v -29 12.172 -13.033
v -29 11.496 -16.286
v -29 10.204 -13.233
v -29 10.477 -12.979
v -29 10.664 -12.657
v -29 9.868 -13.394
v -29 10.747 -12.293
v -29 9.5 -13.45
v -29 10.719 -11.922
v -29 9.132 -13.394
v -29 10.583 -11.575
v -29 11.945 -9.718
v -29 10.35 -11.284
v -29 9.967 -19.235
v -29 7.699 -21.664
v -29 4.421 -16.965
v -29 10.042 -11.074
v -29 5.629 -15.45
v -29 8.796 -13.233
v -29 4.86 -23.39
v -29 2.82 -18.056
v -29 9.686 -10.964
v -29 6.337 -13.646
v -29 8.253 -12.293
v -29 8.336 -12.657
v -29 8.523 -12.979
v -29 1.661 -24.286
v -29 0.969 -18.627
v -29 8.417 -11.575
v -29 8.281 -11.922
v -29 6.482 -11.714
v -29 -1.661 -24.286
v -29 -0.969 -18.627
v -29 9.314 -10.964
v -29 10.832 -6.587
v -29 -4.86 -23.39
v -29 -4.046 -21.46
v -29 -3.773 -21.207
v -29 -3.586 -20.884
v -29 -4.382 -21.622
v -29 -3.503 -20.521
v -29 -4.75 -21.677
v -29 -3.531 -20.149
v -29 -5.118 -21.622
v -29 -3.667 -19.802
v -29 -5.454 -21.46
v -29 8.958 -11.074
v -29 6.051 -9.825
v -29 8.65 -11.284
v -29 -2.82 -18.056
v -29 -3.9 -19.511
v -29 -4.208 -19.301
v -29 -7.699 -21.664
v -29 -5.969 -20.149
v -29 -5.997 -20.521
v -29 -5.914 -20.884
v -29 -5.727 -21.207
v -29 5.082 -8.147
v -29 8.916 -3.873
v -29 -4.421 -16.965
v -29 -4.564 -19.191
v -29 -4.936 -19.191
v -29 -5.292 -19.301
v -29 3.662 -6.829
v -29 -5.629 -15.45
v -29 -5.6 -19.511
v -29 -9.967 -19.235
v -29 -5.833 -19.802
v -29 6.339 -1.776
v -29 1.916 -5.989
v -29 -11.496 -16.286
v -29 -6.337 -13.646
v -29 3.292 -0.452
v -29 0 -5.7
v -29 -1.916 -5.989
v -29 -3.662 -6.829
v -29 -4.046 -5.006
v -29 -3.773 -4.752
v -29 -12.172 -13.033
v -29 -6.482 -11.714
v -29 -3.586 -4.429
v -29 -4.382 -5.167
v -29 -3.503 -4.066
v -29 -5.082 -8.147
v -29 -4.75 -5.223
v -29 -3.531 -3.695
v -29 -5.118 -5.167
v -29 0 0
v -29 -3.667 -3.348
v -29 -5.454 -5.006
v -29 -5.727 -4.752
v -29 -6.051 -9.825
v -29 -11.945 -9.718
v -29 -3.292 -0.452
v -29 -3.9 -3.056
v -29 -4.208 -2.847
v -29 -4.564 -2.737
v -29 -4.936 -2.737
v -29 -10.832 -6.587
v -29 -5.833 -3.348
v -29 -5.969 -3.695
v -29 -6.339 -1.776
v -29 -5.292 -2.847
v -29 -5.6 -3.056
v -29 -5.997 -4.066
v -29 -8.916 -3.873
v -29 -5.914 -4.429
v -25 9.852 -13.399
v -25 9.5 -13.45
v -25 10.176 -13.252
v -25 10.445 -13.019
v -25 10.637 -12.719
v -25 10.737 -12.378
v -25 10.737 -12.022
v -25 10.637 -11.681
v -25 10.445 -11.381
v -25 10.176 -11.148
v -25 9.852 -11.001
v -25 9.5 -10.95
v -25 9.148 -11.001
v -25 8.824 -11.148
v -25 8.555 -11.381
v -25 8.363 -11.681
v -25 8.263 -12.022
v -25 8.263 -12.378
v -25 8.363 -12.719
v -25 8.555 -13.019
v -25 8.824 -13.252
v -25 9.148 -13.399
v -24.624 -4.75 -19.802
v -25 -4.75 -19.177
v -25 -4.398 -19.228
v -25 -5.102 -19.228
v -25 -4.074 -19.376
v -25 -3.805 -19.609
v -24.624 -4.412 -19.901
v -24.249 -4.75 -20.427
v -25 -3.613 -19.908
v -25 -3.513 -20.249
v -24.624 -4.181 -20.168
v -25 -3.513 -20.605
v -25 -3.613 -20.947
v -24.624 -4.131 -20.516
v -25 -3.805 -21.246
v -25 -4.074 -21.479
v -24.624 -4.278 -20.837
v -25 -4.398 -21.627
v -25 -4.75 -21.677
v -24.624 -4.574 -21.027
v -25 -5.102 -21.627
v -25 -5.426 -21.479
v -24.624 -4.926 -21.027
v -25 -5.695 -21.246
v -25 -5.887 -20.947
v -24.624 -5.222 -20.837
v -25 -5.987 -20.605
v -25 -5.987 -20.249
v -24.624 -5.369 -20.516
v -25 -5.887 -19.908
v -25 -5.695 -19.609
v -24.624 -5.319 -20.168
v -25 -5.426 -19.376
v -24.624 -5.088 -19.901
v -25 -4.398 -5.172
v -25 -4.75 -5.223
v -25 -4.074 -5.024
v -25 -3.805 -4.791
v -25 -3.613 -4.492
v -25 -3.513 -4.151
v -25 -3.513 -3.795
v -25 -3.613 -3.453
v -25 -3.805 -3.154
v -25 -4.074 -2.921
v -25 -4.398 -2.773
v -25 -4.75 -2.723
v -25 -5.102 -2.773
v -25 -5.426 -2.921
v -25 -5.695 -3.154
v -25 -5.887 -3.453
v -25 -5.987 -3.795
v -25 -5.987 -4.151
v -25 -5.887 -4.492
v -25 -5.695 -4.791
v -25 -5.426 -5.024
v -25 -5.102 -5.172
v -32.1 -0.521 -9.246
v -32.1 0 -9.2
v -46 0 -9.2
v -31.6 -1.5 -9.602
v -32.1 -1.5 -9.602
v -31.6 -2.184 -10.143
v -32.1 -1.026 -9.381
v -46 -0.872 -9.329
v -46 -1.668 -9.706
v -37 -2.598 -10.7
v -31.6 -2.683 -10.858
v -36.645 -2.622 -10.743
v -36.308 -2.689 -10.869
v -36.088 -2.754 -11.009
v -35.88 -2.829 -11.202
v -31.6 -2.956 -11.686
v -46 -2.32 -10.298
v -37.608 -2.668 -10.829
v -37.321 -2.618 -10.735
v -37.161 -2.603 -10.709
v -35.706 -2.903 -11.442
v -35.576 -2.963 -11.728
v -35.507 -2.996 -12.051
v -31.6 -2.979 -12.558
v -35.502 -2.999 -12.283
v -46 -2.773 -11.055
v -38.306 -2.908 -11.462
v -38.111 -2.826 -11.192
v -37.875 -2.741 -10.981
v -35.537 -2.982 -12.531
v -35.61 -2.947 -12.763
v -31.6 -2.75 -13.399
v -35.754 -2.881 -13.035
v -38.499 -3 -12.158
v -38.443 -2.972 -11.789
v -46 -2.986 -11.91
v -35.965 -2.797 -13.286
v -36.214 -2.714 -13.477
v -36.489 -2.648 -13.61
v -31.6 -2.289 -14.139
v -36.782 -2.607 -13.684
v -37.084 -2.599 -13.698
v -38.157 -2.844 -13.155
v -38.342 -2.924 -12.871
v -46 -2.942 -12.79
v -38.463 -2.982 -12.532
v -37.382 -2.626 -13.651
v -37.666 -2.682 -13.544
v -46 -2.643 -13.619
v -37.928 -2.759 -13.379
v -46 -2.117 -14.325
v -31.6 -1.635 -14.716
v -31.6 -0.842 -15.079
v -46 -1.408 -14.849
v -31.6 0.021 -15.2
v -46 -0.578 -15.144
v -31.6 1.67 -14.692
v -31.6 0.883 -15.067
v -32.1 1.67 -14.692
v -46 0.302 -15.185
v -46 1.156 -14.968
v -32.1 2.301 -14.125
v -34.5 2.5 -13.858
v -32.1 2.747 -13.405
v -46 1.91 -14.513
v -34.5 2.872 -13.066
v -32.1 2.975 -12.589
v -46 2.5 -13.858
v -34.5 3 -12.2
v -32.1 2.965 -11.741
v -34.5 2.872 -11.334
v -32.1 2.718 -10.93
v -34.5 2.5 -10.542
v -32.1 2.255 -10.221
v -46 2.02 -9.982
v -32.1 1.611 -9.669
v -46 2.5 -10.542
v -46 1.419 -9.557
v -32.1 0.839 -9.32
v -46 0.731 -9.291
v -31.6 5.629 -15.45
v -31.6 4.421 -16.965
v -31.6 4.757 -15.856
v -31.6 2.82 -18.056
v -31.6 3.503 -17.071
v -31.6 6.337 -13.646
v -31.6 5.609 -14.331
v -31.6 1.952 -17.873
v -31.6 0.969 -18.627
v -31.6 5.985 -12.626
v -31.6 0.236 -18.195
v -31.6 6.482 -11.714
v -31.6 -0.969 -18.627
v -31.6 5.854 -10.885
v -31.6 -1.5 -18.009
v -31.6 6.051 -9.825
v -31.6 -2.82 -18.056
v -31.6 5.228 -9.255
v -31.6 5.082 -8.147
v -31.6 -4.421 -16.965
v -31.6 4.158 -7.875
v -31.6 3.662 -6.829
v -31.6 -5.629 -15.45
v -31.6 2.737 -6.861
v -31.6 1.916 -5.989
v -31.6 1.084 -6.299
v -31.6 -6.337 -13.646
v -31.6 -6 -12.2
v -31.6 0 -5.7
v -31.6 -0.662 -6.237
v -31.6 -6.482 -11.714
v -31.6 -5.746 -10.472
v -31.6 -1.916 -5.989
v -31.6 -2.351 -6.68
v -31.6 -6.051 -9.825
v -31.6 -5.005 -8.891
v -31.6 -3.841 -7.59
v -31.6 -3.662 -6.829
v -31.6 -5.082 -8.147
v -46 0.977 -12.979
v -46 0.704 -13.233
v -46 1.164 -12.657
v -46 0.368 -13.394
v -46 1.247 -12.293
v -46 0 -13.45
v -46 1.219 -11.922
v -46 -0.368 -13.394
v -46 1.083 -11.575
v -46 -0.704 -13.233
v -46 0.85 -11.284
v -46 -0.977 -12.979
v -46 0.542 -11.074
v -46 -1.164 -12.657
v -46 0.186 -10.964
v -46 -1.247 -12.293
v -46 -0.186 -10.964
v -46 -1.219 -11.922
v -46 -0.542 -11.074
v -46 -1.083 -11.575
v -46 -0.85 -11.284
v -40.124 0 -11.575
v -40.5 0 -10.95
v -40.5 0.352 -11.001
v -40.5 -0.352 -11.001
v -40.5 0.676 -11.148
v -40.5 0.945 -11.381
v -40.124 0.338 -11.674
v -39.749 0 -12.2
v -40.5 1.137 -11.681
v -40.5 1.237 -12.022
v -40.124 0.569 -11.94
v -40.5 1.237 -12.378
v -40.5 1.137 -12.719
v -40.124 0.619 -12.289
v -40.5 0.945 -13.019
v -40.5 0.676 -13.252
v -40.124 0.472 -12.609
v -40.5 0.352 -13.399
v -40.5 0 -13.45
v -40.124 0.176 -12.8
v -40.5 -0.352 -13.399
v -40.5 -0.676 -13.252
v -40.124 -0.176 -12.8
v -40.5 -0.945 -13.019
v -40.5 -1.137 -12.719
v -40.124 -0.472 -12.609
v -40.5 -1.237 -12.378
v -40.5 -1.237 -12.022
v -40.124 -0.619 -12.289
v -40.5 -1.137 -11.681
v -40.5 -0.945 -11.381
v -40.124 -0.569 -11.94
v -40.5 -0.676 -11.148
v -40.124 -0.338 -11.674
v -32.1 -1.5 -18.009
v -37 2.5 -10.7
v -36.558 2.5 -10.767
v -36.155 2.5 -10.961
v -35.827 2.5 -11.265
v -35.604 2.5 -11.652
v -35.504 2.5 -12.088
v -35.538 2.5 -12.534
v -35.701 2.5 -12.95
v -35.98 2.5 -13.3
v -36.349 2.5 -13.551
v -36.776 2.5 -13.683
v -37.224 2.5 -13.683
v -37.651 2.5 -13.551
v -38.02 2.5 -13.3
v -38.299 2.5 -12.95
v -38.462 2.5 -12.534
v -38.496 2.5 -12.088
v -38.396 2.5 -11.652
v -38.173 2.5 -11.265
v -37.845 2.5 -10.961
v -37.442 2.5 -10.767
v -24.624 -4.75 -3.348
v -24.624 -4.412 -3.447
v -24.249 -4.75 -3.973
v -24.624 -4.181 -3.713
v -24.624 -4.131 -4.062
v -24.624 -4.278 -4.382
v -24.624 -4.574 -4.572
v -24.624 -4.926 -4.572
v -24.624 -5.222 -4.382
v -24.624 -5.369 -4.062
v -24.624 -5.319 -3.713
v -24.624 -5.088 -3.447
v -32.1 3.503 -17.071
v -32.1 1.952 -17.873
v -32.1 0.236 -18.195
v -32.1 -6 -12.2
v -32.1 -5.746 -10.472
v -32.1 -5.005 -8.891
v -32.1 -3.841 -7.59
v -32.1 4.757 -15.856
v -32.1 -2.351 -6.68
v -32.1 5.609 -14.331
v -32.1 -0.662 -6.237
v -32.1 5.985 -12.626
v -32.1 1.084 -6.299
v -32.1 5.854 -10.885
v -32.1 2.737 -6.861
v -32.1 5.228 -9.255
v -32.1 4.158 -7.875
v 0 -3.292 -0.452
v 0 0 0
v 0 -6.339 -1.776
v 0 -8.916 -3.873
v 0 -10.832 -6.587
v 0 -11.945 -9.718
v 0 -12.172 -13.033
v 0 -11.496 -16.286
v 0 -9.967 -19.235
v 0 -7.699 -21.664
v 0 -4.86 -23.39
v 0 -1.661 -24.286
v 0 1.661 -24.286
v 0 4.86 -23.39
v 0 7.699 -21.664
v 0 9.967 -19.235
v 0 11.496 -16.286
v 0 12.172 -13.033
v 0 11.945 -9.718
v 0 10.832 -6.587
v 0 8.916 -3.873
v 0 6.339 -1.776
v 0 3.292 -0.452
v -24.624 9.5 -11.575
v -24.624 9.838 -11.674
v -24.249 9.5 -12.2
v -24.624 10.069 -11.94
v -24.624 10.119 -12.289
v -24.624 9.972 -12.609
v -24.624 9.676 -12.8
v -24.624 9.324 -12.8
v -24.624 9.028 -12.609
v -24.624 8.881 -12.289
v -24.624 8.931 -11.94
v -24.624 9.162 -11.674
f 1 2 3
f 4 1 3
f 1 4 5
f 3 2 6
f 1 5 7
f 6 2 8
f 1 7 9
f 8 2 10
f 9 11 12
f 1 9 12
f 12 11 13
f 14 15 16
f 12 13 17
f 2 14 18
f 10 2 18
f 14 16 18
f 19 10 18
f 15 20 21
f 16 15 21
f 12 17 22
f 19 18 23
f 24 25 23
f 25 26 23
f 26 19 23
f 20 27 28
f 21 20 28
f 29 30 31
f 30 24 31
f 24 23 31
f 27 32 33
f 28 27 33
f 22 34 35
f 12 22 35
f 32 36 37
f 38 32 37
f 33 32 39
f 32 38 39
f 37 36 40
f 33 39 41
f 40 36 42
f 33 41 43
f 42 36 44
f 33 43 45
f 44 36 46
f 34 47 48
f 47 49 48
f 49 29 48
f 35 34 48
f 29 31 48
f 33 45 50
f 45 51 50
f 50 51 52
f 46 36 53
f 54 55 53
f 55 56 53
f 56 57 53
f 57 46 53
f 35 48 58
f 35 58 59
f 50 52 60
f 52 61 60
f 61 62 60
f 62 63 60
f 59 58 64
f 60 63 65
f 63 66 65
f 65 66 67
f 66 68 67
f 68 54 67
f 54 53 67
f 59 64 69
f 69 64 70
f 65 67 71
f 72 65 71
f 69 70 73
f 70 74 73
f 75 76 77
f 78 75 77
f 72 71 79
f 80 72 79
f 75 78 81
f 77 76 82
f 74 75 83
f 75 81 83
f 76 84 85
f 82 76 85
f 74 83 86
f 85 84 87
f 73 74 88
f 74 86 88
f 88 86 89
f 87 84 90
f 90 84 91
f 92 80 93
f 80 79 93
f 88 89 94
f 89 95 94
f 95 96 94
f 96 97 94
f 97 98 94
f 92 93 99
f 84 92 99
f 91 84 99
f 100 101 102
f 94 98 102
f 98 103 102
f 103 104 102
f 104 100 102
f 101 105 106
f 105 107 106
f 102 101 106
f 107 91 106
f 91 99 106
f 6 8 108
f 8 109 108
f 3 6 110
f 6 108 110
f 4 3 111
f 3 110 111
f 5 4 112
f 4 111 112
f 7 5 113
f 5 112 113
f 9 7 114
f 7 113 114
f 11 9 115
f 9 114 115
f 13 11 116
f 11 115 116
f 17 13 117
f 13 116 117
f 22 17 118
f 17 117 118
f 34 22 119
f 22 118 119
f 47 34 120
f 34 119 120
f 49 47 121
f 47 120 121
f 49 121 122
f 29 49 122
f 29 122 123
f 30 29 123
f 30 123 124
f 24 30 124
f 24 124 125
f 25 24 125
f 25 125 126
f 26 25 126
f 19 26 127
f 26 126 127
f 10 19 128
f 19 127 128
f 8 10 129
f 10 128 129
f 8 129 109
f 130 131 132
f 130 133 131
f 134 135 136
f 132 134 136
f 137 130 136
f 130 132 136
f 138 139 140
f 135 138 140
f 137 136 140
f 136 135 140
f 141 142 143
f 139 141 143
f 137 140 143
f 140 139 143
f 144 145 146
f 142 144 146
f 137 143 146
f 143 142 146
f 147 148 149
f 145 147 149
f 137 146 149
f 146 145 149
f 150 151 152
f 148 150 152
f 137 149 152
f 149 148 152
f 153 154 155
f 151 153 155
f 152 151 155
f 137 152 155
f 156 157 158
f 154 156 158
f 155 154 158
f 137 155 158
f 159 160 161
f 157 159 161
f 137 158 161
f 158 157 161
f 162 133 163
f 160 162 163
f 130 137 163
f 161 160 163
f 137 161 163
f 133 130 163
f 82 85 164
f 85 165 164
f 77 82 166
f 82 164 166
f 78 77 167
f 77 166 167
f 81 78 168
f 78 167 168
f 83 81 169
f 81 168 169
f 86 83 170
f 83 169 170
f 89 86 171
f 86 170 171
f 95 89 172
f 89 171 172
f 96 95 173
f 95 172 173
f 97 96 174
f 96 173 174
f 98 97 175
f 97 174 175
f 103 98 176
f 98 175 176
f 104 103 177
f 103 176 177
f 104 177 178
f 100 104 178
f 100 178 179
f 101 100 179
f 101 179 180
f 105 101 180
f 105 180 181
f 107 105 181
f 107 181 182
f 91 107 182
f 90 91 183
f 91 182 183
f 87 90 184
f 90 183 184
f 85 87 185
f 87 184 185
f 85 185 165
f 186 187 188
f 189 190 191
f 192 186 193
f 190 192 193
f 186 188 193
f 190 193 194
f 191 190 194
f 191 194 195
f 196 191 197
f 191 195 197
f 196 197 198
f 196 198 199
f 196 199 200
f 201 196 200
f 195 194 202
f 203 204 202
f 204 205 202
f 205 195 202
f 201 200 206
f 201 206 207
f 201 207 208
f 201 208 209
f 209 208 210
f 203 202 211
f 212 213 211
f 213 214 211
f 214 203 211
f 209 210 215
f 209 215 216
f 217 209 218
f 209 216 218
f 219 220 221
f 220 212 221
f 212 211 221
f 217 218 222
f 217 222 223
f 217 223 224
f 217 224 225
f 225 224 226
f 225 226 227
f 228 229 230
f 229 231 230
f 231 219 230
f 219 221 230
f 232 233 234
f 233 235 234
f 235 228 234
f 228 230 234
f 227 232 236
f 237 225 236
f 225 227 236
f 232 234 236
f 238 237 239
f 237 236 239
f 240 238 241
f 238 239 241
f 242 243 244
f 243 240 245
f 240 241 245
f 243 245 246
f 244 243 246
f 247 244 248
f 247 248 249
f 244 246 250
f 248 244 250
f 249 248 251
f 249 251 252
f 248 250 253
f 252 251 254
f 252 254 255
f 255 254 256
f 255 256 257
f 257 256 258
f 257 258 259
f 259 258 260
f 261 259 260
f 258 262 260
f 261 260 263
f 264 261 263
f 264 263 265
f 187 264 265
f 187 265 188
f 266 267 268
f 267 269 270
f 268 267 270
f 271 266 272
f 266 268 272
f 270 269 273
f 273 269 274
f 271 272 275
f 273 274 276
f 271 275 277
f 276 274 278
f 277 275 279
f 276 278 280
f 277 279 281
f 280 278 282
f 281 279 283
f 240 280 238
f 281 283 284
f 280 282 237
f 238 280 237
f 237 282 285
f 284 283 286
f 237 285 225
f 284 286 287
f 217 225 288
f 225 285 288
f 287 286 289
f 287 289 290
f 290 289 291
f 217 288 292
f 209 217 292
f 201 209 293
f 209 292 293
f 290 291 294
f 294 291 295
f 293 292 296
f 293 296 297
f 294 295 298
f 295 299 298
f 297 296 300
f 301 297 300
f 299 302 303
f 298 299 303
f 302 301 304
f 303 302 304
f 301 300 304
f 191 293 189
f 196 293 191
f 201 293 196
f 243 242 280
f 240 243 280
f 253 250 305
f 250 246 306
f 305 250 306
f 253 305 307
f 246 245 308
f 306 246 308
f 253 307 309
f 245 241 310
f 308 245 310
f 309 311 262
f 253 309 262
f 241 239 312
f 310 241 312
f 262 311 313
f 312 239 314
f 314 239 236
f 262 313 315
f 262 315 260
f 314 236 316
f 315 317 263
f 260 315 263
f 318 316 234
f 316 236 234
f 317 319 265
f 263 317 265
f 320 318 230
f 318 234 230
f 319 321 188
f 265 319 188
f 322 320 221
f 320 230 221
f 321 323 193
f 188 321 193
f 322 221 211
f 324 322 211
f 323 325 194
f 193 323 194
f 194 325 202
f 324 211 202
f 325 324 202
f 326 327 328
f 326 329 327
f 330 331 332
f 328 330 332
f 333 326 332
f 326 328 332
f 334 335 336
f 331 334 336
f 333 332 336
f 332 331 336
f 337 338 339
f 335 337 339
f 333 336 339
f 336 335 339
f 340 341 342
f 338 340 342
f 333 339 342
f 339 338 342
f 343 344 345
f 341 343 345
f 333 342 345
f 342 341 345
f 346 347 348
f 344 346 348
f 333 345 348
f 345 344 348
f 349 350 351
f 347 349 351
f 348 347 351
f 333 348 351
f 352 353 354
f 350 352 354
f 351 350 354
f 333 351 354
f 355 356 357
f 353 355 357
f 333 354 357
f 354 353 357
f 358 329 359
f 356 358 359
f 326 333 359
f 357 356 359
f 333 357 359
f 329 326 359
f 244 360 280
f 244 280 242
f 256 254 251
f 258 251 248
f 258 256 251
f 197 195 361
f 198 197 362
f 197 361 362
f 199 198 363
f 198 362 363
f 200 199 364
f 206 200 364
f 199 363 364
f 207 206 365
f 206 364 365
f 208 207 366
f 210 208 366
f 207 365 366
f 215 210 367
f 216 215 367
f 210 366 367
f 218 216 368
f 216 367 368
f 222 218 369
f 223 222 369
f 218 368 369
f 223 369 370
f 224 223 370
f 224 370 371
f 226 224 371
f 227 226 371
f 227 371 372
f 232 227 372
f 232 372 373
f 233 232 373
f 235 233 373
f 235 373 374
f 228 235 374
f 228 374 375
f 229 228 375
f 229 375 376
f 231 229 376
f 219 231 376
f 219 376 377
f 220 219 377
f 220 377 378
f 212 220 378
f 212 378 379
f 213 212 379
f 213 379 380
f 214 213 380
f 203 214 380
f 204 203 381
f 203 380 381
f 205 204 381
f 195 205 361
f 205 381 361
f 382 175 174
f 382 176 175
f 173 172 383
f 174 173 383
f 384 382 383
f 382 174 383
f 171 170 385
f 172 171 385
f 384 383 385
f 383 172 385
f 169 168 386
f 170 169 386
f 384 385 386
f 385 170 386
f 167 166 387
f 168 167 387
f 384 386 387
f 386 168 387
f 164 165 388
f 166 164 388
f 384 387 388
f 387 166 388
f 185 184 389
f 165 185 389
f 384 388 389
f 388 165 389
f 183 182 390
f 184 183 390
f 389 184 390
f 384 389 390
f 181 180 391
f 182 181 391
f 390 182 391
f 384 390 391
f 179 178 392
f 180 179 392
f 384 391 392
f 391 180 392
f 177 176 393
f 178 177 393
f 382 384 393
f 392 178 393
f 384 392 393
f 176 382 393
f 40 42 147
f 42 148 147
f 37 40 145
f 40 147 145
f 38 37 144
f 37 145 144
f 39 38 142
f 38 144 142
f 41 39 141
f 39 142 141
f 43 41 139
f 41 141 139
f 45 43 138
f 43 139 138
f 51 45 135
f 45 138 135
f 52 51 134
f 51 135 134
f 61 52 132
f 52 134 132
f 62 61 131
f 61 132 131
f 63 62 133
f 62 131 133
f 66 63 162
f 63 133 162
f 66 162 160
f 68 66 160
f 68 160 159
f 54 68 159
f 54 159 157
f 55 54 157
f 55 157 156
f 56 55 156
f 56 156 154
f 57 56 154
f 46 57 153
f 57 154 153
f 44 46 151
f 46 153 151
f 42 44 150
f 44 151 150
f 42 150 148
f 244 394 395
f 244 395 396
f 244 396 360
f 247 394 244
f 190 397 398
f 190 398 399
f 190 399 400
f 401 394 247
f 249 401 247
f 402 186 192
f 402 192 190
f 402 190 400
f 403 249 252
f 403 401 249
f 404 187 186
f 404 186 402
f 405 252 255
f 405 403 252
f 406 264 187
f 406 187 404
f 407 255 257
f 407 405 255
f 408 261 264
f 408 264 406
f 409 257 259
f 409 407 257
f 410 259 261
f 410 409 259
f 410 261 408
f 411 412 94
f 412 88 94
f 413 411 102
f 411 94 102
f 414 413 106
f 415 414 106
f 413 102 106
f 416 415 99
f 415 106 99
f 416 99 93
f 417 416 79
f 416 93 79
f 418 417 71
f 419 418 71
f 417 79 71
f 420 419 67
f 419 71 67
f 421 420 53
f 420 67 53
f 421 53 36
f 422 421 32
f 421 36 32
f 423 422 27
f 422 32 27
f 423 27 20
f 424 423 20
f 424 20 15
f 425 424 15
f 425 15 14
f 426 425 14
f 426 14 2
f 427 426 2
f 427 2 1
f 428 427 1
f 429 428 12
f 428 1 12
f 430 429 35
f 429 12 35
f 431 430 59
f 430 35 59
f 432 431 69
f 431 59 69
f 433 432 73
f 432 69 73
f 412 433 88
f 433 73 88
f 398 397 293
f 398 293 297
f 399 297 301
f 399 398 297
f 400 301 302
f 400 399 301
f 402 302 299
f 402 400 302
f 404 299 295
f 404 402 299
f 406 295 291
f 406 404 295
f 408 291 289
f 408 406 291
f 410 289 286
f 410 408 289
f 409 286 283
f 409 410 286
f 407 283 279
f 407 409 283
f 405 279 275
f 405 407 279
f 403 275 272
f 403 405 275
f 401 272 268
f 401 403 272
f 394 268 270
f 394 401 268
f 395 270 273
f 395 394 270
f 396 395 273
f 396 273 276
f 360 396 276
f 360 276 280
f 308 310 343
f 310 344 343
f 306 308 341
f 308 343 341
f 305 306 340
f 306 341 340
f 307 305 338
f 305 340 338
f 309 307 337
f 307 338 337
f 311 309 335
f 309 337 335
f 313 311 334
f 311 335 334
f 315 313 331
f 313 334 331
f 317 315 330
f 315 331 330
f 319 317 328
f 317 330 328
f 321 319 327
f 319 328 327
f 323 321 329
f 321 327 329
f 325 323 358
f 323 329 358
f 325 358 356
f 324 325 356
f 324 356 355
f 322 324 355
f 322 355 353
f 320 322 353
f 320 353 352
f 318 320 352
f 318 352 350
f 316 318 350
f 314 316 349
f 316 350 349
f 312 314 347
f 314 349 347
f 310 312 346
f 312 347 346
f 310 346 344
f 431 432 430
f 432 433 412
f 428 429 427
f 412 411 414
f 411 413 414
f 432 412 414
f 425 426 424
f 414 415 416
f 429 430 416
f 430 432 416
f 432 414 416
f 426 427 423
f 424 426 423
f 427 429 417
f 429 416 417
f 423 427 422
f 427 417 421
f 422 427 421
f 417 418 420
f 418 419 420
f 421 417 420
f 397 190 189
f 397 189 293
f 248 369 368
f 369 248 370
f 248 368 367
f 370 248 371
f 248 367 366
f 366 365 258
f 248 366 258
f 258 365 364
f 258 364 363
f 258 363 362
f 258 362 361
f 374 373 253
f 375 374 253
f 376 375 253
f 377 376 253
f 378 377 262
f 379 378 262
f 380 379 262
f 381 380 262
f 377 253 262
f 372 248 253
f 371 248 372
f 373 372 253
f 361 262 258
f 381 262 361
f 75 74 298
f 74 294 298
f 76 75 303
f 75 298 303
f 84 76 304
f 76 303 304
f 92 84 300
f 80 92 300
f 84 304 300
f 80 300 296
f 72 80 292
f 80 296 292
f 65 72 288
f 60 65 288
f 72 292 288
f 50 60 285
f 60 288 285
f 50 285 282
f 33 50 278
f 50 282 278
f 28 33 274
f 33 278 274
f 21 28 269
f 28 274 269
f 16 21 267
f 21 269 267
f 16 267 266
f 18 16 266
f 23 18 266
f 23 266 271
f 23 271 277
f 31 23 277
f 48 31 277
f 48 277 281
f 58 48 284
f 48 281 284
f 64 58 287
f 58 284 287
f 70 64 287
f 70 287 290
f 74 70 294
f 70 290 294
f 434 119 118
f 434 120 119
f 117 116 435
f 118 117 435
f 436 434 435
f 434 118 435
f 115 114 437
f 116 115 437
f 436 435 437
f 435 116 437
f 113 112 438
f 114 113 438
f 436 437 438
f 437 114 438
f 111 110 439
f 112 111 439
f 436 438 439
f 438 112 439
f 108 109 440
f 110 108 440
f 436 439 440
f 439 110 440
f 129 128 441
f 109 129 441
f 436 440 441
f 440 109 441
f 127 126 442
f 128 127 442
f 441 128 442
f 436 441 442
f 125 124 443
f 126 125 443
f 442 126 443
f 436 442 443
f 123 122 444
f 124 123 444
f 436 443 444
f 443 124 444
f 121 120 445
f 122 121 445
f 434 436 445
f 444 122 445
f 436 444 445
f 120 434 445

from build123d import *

# Parameters (mm, degrees)
CUT_EXTRUDE_3_DEPTH    = 11.5
HOLE_WIZARD_M3_1_D     = 2.5
HOLE_WIZARD_M3_1_DEPTH = 5.5
HOLE_WIZARD_M3_1_TIP   = 0.751075774
SKETCH_12_R            = 1.5
CUT_EXTRUDE_4_DEPTH    = 11.5
HOLE_WIZARD_M3_2_D     = 2.5
HOLE_WIZARD_M3_2_DEPTH = 4
HOLE_WIZARD_M3_2_TIP   = 0.751075774
EXTRUDE_START          = 0.5
EXTRUDE_1_DEPTH        = 0.5


with BuildPart() as part:
    # 草图1 → 旋转1 (revolve)
    with BuildSketch(Plane(origin=(0, 0, 0), x_dir=(1, 0, 0), z_dir=(0, 1, 0))):
        Polygon((0, 0), (-29, 0), (-29, 5.7), (-31.6, 5.7), (-31.6, 9.2), (-46, 9.2), (-46, 12.2), (0, 12.2), align=None)
    revolve(axis=Axis((-46, 0, -12.2), (1, 0, 0)))

    # 草图9 → 切除-拉伸3 (cut)
    with BuildSketch(Plane.ZY.offset(46)):
        with BuildLine():
            Line((-12.2, 2.5), (-10.541687605, 2.5))
            ThreePointArc((-10.541687605, 2.5), (-12.2, 3), (-13.858312395, 2.5))
            Line((-13.858312395, 2.5), (-12.2, 2.5))
        make_face()
    extrude(amount=-CUT_EXTRUDE_3_DEPTH, mode=Mode.SUBTRACT)

    # M3 螺纹孔1
    with Locations(Plane.ZY.offset(46)):
        with Locations((-12.2, 0)):
            Hole(HOLE_WIZARD_M3_1_D / 2, depth=HOLE_WIZARD_M3_1_DEPTH)
            with Locations((0, 0, -(HOLE_WIZARD_M3_1_DEPTH + HOLE_WIZARD_M3_1_TIP / 2))):  # 118° drill point
                Cone(0, HOLE_WIZARD_M3_1_D / 2, HOLE_WIZARD_M3_1_TIP, mode=Mode.SUBTRACT)

    # 草图12 → 切除-拉伸4 (cut)
    with BuildSketch(Plane(origin=(0, 2.5, 0), x_dir=(1, 0, 0), z_dir=(0, 1, 0))):
        with Locations(Location((-37, 12.2, 0), (0, 0, 270))):
            Circle(SKETCH_12_R)
    extrude(amount=-CUT_EXTRUDE_4_DEPTH, mode=Mode.SUBTRACT)

    # M3 螺纹孔2
    with Locations(Plane.ZY.offset(29)):
        with Locations((-12.2, 9.5), (-20.427241336, -4.75), (-3.972758664, -4.75)):
            Hole(HOLE_WIZARD_M3_2_D / 2, depth=HOLE_WIZARD_M3_2_DEPTH)
            with Locations((0, 0, -(HOLE_WIZARD_M3_2_DEPTH + HOLE_WIZARD_M3_2_TIP / 2))):  # 118° drill point
                Cone(0, HOLE_WIZARD_M3_2_D / 2, HOLE_WIZARD_M3_2_TIP, mode=Mode.SUBTRACT)

    # 草图16 → 凸台-拉伸1 (add)
    with BuildSketch(Plane.ZY.offset(31.6).offset(EXTRUDE_START)):
        with BuildLine():
            Line((-9.601923789, -1.5), (-12.2, -6))
            ThreePointArc((-12.2, -6), (-8.525765386, 4.74341649), (-18.009475019, -1.5))
            Line((-18.009475019, -1.5), (-14.69206472, 1.670213589))
            ThreePointArc((-14.69206472, 1.670213589), (-10.614007201, 2.546493048), (-9.601923789, -1.5))
        make_face()
    extrude(amount=-EXTRUDE_1_DEPTH)


solid = part.part
